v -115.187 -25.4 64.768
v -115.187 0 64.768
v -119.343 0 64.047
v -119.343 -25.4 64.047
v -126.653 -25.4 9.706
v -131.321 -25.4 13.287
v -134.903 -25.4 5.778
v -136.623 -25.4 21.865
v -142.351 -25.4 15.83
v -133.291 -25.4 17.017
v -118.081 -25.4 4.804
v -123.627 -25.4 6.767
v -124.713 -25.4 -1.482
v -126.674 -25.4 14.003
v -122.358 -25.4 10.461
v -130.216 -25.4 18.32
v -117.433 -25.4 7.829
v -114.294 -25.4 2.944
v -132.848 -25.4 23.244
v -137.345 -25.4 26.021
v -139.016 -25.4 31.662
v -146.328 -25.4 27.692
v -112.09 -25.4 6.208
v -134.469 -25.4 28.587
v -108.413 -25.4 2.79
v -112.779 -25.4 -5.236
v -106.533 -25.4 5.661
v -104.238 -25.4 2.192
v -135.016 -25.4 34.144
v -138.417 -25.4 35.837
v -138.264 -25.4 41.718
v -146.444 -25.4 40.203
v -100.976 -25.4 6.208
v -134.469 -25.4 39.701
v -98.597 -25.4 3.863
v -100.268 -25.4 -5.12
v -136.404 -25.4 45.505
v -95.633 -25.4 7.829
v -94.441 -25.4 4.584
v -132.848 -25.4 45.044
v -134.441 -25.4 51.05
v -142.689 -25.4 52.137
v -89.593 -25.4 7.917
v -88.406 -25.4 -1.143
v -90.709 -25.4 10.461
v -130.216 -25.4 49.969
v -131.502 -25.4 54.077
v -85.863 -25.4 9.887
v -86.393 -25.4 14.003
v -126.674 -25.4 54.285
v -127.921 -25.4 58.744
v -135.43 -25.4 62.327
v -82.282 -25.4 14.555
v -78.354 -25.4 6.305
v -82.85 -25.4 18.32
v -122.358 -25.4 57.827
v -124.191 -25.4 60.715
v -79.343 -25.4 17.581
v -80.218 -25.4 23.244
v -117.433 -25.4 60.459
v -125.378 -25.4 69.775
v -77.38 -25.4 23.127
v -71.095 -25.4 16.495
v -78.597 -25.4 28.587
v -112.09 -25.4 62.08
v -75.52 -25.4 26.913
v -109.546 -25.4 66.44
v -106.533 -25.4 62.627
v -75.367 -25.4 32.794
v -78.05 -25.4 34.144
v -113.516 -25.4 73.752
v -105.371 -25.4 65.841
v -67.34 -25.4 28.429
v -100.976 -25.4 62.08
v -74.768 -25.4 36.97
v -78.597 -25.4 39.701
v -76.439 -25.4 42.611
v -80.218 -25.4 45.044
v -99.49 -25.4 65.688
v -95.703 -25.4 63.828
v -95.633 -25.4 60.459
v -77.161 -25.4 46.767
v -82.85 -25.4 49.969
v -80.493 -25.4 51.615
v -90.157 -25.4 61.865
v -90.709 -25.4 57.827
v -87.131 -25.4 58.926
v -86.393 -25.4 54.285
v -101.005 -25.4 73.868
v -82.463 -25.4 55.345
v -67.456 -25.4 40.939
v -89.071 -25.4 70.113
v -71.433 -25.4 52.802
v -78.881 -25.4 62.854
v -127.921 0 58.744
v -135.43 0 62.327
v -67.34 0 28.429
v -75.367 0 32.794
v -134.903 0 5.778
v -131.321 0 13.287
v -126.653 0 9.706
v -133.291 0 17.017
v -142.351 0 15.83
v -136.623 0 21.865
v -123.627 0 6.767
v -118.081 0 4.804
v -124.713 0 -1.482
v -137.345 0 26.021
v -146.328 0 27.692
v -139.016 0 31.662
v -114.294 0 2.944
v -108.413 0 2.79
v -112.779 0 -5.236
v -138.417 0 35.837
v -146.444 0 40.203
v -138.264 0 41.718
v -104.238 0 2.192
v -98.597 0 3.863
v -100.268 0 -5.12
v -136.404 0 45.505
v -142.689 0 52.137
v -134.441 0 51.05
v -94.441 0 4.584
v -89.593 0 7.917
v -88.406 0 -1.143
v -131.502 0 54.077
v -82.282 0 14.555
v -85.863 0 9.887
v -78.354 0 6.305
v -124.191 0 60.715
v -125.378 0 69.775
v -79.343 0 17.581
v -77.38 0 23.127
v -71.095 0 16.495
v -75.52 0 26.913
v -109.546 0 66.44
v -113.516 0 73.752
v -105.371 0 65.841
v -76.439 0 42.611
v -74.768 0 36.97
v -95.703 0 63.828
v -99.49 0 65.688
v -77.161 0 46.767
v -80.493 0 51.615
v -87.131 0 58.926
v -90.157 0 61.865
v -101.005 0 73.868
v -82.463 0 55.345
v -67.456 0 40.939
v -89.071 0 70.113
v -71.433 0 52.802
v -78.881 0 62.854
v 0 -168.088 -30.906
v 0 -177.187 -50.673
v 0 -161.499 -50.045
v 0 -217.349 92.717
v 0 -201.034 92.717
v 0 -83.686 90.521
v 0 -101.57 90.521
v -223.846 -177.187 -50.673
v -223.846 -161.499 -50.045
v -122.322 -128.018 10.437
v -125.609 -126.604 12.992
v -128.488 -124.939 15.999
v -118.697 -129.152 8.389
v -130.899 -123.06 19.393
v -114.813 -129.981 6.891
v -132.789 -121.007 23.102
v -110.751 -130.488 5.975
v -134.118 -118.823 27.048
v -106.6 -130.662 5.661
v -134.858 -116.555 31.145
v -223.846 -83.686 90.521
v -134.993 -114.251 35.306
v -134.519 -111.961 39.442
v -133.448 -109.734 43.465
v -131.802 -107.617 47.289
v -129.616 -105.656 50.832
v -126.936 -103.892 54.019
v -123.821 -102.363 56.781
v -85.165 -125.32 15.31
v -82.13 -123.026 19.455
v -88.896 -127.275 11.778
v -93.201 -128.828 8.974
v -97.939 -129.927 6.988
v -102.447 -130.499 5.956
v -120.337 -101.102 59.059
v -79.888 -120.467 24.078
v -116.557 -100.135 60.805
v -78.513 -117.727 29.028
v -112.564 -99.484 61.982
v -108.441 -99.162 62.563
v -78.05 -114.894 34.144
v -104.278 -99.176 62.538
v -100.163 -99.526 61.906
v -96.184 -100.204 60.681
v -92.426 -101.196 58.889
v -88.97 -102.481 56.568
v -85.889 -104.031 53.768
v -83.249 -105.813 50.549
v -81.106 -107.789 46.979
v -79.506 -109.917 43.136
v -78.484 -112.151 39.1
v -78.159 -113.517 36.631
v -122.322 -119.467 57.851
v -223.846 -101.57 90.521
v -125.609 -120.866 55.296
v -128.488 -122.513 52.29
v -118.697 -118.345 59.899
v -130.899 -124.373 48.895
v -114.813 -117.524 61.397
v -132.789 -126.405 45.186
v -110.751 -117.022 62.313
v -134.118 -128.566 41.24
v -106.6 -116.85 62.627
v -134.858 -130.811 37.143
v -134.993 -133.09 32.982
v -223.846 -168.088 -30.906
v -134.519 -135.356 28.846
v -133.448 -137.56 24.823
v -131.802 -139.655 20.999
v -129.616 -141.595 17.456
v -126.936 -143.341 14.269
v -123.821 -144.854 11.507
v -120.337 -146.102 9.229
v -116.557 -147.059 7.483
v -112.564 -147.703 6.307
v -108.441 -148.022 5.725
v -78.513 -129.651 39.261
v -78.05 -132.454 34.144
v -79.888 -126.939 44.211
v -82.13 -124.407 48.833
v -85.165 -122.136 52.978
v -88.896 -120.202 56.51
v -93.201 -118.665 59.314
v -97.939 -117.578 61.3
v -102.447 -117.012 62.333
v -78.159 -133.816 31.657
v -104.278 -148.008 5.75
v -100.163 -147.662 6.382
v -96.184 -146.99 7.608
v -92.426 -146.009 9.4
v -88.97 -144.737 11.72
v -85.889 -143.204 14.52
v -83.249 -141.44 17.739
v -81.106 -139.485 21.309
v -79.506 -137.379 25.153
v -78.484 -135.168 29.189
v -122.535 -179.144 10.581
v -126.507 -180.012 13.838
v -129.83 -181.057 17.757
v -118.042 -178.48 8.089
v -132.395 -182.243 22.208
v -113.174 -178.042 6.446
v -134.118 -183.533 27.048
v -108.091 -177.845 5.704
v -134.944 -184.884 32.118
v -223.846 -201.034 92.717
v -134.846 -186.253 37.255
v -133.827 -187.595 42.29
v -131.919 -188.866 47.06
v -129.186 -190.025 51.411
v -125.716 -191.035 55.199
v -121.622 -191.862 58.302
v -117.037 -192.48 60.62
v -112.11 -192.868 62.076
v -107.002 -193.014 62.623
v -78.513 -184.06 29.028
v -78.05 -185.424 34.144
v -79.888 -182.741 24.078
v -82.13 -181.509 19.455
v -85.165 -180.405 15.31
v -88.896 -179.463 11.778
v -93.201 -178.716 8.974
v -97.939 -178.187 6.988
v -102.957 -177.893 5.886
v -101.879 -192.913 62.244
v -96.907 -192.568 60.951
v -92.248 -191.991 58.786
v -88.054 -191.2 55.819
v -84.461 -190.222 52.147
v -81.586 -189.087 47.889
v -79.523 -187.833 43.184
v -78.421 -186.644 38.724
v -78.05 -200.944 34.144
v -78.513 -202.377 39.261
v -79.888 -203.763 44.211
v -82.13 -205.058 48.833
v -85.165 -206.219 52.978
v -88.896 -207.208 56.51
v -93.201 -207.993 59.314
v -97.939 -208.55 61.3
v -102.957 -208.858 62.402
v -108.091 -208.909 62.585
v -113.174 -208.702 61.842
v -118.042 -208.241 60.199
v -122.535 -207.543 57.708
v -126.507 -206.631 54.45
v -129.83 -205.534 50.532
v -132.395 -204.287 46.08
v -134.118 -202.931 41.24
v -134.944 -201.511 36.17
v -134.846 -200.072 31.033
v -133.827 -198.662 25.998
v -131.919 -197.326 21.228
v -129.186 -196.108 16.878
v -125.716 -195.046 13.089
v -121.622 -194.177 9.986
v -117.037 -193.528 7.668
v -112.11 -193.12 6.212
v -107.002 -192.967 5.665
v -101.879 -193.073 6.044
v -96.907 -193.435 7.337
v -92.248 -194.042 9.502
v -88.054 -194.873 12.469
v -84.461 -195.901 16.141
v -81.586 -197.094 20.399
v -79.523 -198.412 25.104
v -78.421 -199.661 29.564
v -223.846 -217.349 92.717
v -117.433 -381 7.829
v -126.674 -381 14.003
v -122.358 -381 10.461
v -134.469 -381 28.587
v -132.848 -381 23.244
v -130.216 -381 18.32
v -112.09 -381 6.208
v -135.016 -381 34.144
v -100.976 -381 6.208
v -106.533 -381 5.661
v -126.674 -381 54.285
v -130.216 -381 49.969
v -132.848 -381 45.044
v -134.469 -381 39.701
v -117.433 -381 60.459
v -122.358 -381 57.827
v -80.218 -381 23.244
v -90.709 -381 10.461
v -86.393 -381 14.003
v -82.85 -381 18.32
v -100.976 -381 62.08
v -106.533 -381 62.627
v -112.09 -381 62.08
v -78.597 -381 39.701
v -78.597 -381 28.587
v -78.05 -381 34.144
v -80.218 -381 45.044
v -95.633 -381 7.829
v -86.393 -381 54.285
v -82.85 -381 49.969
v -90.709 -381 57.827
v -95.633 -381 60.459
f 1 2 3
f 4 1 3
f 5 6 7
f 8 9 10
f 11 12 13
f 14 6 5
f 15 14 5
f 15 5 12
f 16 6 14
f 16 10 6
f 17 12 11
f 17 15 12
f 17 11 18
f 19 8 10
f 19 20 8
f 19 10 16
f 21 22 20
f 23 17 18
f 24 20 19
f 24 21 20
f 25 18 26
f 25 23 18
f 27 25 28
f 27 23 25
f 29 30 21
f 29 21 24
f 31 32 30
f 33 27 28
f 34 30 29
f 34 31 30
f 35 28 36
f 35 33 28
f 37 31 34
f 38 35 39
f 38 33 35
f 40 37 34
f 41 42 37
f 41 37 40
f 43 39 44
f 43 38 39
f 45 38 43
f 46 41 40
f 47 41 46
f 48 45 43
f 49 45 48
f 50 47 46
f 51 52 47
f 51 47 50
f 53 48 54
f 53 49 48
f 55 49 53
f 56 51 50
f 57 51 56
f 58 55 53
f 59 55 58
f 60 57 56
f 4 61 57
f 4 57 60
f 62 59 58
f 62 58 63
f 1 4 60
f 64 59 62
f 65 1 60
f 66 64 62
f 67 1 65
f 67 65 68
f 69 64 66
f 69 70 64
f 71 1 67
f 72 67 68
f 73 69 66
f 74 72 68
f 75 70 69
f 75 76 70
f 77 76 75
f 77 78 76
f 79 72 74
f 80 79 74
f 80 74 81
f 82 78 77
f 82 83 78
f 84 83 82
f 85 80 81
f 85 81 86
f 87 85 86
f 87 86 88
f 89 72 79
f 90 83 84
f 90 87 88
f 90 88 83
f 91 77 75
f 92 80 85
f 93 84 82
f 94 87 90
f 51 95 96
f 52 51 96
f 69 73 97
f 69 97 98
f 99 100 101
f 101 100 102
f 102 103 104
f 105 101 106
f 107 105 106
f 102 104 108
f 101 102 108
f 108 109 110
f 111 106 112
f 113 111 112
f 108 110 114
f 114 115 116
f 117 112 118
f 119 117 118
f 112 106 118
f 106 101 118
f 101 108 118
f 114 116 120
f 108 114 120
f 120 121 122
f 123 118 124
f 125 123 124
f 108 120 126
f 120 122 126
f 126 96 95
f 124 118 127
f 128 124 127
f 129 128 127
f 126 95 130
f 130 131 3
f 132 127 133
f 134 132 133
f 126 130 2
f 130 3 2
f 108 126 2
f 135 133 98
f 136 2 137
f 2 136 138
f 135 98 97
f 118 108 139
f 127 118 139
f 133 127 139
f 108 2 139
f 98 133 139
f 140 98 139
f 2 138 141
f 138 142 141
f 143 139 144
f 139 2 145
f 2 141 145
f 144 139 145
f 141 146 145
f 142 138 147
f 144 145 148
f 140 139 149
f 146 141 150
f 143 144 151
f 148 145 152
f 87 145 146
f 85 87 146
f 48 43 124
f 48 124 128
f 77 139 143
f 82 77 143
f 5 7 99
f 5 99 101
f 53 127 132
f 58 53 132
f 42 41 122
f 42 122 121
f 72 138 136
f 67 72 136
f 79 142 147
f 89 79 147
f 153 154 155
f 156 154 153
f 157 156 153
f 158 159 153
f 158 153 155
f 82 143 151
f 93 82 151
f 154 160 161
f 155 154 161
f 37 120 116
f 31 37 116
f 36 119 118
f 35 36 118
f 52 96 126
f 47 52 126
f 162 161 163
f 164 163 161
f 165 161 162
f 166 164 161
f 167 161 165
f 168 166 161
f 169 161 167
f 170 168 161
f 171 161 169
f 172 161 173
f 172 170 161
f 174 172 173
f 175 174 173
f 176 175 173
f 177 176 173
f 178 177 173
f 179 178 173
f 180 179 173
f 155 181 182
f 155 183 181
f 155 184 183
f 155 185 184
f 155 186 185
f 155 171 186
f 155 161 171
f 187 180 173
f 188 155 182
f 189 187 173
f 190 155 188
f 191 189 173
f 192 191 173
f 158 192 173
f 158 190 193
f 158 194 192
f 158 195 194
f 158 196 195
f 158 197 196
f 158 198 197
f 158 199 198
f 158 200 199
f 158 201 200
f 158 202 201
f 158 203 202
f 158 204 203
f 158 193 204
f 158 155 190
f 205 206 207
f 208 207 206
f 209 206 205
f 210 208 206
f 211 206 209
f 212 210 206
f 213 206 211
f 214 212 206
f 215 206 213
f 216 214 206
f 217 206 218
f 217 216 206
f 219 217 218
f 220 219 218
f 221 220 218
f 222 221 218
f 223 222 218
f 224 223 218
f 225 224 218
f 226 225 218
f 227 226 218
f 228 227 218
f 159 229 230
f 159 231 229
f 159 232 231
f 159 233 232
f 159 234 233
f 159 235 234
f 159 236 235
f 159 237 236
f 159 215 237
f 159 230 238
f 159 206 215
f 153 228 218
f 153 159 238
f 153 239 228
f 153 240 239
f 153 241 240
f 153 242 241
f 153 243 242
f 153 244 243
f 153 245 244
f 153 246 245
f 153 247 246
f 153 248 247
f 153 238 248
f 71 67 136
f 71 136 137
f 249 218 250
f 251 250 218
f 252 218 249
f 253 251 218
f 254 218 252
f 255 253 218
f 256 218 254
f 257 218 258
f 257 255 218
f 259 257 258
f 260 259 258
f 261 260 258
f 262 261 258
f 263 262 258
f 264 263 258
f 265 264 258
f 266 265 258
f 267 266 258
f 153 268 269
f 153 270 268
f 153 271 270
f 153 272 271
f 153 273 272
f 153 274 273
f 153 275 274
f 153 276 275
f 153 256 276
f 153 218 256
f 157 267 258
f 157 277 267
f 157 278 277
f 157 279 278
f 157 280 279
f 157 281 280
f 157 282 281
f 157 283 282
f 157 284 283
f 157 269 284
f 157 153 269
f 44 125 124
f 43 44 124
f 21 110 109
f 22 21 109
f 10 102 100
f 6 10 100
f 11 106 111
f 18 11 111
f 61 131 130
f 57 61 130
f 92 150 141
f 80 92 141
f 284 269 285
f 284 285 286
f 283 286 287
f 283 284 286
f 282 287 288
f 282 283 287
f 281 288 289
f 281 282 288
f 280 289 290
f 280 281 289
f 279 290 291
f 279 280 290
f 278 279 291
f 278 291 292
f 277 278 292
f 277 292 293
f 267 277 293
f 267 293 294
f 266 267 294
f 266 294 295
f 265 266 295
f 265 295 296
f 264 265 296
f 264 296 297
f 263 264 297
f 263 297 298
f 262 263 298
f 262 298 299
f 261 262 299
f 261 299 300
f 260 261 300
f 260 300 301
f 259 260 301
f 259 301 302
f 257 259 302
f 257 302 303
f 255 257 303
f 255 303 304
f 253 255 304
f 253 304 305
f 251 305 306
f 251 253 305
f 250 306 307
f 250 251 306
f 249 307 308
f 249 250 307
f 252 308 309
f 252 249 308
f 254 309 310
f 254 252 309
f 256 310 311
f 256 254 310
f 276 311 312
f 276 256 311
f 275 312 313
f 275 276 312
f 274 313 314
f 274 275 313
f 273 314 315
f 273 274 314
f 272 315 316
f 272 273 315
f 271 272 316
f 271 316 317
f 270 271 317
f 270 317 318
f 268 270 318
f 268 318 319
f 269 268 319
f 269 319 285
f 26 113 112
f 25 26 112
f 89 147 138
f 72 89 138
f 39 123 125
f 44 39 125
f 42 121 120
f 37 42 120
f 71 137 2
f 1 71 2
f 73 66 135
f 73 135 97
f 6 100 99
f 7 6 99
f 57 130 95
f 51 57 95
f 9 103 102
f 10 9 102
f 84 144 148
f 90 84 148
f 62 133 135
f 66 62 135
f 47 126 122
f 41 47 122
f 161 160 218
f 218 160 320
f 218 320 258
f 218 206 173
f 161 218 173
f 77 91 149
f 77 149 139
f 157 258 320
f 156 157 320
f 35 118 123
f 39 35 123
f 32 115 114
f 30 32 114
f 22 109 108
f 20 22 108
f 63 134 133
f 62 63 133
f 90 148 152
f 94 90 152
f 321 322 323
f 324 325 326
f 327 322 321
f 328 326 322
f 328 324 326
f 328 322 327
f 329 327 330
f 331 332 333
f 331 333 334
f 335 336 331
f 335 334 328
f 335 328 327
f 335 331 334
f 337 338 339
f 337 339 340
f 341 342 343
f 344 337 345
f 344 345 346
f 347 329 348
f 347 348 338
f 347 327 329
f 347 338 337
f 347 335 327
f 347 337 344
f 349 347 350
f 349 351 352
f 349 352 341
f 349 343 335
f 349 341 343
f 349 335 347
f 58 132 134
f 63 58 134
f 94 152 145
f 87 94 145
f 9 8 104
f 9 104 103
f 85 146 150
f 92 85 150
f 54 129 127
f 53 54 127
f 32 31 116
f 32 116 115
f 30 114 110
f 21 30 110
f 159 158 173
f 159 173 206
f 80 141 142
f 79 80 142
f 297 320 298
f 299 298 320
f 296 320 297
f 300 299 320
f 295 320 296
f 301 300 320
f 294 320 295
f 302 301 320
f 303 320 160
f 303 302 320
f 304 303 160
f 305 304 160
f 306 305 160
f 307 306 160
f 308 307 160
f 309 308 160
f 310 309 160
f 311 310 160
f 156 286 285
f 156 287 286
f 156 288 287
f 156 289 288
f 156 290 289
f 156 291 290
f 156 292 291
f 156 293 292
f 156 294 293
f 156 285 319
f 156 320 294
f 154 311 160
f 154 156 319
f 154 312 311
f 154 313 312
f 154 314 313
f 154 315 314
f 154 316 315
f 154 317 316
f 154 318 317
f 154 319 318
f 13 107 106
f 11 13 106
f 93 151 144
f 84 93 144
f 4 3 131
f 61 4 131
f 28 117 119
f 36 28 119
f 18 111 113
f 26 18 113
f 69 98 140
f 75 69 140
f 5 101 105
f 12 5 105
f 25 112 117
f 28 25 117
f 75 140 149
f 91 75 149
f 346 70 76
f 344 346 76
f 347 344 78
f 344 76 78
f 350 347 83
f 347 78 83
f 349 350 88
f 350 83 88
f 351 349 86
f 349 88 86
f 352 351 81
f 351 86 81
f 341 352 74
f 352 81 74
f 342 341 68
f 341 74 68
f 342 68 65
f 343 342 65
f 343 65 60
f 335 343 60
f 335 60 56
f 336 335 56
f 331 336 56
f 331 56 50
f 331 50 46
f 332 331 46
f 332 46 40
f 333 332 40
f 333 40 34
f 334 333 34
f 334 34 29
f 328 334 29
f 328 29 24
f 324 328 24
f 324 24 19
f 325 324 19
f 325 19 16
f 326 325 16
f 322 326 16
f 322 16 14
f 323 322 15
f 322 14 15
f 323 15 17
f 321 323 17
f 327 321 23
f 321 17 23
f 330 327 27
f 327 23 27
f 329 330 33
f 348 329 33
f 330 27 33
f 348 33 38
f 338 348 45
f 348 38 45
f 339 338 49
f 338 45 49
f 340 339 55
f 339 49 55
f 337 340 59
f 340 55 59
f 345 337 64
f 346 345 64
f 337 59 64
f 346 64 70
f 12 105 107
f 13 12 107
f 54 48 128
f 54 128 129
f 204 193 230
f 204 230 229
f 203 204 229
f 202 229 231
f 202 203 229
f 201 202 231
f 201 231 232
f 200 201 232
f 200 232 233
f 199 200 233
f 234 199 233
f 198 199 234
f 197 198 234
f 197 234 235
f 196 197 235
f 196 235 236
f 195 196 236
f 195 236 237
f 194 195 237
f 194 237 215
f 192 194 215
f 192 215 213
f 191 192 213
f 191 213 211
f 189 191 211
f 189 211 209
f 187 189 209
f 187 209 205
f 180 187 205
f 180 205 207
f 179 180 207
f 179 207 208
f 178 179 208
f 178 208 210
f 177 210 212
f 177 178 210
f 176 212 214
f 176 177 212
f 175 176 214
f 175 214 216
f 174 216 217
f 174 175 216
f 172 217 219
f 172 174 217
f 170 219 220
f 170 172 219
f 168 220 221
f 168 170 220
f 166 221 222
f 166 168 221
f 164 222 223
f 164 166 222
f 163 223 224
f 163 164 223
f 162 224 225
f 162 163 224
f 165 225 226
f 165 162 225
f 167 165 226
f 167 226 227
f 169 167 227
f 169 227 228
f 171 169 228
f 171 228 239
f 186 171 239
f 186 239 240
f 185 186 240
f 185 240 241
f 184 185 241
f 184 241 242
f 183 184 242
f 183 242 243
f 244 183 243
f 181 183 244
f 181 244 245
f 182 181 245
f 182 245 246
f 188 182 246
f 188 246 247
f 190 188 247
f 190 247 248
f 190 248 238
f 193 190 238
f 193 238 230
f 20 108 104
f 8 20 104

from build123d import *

# Parameters (mm, degrees)
F0_R     = 28.483217
F1_DEPTH = 381
F3_DEPTH = 223.84599
F6_DEPTH = 25.4


with BuildPart() as f1:
    # F0 (on Front) → F1 (new body)
    with BuildSketch(Plane.XZ):
        with Locations((-106.533237, 34.144115)):
            Circle(F0_R)
    extrude(amount=F1_DEPTH)

    # F5 (on Front) → F6 (join)
    with BuildSketch(Plane.XZ):
        Polygon((-113.515615, 73.751561), (-115.186885, 64.768493), (-119.343266, 64.047263), (-125.377729, 69.774635), (-124.19128, 60.714779), (-127.921361, 58.744456), (-135.430331, 62.326759), (-131.502302, 54.076956), (-134.440956, 51.050409), (-142.689404, 52.136982), (-136.404297, 45.504782), (-138.263869, 41.71827), (-146.444378, 40.202753), (-138.417424, 35.83736), (-139.015885, 31.661534), (-146.327691, 27.692274), (-137.344623, 26.021005), (-136.623393, 21.864624), (-142.350765, 15.830161), (-133.290909, 17.01661), (-131.320586, 13.286529), (-134.902889, 5.777559), (-126.653086, 9.705588), (-123.626539, 6.766934), (-124.713112, -1.481514), (-118.080912, 4.803593), (-114.2944, 2.944021), (-112.778883, -5.236488), (-108.41349, 2.790466), (-104.237664, 2.192005), (-100.268404, -5.119801), (-98.597135, 3.863267), (-94.440754, 4.584497), (-88.406291, -1.142875), (-89.59274, 7.916981), (-85.862659, 9.887304), (-78.353689, 6.305001), (-82.281718, 14.554804), (-79.343064, 17.581351), (-71.094616, 16.494777), (-77.379723, 23.126978), (-75.520151, 26.91349), (-67.339642, 28.429007), (-75.366596, 32.7944), (-74.768135, 36.970226), (-67.456329, 40.939485), (-76.439397, 42.610755), (-77.160627, 46.767136), (-71.433255, 52.801599), (-80.493111, 51.61515), (-82.463434, 55.345231), (-78.881131, 62.854201), (-87.130934, 58.926172), (-90.157481, 61.864826), (-89.070907, 70.113274), (-95.703108, 63.828167), (-99.48962, 65.687739), (-101.005137, 73.868248), (-105.37053, 65.841294), (-109.546356, 66.439755), align=None)
    extrude(amount=F6_DEPTH)


with BuildPart() as f3:
    # F2 (on Right) → F3 (new body)
    with BuildSketch(Plane.YZ):
        Polygon((-161.499187, -50.045472), (-83.685532, 90.52112), (-101.570122, 90.52112), (-168.088242, -30.905824), (-201.033533, 92.717469), (-217.349291, 92.717469), (-177.187413, -50.673004), align=None)
    extrude(amount=-F3_DEPTH)

    # F4: cut F1
    add(f1.part, mode=Mode.SUBTRACT)


solid = Compound([f1.part, f3.part])
